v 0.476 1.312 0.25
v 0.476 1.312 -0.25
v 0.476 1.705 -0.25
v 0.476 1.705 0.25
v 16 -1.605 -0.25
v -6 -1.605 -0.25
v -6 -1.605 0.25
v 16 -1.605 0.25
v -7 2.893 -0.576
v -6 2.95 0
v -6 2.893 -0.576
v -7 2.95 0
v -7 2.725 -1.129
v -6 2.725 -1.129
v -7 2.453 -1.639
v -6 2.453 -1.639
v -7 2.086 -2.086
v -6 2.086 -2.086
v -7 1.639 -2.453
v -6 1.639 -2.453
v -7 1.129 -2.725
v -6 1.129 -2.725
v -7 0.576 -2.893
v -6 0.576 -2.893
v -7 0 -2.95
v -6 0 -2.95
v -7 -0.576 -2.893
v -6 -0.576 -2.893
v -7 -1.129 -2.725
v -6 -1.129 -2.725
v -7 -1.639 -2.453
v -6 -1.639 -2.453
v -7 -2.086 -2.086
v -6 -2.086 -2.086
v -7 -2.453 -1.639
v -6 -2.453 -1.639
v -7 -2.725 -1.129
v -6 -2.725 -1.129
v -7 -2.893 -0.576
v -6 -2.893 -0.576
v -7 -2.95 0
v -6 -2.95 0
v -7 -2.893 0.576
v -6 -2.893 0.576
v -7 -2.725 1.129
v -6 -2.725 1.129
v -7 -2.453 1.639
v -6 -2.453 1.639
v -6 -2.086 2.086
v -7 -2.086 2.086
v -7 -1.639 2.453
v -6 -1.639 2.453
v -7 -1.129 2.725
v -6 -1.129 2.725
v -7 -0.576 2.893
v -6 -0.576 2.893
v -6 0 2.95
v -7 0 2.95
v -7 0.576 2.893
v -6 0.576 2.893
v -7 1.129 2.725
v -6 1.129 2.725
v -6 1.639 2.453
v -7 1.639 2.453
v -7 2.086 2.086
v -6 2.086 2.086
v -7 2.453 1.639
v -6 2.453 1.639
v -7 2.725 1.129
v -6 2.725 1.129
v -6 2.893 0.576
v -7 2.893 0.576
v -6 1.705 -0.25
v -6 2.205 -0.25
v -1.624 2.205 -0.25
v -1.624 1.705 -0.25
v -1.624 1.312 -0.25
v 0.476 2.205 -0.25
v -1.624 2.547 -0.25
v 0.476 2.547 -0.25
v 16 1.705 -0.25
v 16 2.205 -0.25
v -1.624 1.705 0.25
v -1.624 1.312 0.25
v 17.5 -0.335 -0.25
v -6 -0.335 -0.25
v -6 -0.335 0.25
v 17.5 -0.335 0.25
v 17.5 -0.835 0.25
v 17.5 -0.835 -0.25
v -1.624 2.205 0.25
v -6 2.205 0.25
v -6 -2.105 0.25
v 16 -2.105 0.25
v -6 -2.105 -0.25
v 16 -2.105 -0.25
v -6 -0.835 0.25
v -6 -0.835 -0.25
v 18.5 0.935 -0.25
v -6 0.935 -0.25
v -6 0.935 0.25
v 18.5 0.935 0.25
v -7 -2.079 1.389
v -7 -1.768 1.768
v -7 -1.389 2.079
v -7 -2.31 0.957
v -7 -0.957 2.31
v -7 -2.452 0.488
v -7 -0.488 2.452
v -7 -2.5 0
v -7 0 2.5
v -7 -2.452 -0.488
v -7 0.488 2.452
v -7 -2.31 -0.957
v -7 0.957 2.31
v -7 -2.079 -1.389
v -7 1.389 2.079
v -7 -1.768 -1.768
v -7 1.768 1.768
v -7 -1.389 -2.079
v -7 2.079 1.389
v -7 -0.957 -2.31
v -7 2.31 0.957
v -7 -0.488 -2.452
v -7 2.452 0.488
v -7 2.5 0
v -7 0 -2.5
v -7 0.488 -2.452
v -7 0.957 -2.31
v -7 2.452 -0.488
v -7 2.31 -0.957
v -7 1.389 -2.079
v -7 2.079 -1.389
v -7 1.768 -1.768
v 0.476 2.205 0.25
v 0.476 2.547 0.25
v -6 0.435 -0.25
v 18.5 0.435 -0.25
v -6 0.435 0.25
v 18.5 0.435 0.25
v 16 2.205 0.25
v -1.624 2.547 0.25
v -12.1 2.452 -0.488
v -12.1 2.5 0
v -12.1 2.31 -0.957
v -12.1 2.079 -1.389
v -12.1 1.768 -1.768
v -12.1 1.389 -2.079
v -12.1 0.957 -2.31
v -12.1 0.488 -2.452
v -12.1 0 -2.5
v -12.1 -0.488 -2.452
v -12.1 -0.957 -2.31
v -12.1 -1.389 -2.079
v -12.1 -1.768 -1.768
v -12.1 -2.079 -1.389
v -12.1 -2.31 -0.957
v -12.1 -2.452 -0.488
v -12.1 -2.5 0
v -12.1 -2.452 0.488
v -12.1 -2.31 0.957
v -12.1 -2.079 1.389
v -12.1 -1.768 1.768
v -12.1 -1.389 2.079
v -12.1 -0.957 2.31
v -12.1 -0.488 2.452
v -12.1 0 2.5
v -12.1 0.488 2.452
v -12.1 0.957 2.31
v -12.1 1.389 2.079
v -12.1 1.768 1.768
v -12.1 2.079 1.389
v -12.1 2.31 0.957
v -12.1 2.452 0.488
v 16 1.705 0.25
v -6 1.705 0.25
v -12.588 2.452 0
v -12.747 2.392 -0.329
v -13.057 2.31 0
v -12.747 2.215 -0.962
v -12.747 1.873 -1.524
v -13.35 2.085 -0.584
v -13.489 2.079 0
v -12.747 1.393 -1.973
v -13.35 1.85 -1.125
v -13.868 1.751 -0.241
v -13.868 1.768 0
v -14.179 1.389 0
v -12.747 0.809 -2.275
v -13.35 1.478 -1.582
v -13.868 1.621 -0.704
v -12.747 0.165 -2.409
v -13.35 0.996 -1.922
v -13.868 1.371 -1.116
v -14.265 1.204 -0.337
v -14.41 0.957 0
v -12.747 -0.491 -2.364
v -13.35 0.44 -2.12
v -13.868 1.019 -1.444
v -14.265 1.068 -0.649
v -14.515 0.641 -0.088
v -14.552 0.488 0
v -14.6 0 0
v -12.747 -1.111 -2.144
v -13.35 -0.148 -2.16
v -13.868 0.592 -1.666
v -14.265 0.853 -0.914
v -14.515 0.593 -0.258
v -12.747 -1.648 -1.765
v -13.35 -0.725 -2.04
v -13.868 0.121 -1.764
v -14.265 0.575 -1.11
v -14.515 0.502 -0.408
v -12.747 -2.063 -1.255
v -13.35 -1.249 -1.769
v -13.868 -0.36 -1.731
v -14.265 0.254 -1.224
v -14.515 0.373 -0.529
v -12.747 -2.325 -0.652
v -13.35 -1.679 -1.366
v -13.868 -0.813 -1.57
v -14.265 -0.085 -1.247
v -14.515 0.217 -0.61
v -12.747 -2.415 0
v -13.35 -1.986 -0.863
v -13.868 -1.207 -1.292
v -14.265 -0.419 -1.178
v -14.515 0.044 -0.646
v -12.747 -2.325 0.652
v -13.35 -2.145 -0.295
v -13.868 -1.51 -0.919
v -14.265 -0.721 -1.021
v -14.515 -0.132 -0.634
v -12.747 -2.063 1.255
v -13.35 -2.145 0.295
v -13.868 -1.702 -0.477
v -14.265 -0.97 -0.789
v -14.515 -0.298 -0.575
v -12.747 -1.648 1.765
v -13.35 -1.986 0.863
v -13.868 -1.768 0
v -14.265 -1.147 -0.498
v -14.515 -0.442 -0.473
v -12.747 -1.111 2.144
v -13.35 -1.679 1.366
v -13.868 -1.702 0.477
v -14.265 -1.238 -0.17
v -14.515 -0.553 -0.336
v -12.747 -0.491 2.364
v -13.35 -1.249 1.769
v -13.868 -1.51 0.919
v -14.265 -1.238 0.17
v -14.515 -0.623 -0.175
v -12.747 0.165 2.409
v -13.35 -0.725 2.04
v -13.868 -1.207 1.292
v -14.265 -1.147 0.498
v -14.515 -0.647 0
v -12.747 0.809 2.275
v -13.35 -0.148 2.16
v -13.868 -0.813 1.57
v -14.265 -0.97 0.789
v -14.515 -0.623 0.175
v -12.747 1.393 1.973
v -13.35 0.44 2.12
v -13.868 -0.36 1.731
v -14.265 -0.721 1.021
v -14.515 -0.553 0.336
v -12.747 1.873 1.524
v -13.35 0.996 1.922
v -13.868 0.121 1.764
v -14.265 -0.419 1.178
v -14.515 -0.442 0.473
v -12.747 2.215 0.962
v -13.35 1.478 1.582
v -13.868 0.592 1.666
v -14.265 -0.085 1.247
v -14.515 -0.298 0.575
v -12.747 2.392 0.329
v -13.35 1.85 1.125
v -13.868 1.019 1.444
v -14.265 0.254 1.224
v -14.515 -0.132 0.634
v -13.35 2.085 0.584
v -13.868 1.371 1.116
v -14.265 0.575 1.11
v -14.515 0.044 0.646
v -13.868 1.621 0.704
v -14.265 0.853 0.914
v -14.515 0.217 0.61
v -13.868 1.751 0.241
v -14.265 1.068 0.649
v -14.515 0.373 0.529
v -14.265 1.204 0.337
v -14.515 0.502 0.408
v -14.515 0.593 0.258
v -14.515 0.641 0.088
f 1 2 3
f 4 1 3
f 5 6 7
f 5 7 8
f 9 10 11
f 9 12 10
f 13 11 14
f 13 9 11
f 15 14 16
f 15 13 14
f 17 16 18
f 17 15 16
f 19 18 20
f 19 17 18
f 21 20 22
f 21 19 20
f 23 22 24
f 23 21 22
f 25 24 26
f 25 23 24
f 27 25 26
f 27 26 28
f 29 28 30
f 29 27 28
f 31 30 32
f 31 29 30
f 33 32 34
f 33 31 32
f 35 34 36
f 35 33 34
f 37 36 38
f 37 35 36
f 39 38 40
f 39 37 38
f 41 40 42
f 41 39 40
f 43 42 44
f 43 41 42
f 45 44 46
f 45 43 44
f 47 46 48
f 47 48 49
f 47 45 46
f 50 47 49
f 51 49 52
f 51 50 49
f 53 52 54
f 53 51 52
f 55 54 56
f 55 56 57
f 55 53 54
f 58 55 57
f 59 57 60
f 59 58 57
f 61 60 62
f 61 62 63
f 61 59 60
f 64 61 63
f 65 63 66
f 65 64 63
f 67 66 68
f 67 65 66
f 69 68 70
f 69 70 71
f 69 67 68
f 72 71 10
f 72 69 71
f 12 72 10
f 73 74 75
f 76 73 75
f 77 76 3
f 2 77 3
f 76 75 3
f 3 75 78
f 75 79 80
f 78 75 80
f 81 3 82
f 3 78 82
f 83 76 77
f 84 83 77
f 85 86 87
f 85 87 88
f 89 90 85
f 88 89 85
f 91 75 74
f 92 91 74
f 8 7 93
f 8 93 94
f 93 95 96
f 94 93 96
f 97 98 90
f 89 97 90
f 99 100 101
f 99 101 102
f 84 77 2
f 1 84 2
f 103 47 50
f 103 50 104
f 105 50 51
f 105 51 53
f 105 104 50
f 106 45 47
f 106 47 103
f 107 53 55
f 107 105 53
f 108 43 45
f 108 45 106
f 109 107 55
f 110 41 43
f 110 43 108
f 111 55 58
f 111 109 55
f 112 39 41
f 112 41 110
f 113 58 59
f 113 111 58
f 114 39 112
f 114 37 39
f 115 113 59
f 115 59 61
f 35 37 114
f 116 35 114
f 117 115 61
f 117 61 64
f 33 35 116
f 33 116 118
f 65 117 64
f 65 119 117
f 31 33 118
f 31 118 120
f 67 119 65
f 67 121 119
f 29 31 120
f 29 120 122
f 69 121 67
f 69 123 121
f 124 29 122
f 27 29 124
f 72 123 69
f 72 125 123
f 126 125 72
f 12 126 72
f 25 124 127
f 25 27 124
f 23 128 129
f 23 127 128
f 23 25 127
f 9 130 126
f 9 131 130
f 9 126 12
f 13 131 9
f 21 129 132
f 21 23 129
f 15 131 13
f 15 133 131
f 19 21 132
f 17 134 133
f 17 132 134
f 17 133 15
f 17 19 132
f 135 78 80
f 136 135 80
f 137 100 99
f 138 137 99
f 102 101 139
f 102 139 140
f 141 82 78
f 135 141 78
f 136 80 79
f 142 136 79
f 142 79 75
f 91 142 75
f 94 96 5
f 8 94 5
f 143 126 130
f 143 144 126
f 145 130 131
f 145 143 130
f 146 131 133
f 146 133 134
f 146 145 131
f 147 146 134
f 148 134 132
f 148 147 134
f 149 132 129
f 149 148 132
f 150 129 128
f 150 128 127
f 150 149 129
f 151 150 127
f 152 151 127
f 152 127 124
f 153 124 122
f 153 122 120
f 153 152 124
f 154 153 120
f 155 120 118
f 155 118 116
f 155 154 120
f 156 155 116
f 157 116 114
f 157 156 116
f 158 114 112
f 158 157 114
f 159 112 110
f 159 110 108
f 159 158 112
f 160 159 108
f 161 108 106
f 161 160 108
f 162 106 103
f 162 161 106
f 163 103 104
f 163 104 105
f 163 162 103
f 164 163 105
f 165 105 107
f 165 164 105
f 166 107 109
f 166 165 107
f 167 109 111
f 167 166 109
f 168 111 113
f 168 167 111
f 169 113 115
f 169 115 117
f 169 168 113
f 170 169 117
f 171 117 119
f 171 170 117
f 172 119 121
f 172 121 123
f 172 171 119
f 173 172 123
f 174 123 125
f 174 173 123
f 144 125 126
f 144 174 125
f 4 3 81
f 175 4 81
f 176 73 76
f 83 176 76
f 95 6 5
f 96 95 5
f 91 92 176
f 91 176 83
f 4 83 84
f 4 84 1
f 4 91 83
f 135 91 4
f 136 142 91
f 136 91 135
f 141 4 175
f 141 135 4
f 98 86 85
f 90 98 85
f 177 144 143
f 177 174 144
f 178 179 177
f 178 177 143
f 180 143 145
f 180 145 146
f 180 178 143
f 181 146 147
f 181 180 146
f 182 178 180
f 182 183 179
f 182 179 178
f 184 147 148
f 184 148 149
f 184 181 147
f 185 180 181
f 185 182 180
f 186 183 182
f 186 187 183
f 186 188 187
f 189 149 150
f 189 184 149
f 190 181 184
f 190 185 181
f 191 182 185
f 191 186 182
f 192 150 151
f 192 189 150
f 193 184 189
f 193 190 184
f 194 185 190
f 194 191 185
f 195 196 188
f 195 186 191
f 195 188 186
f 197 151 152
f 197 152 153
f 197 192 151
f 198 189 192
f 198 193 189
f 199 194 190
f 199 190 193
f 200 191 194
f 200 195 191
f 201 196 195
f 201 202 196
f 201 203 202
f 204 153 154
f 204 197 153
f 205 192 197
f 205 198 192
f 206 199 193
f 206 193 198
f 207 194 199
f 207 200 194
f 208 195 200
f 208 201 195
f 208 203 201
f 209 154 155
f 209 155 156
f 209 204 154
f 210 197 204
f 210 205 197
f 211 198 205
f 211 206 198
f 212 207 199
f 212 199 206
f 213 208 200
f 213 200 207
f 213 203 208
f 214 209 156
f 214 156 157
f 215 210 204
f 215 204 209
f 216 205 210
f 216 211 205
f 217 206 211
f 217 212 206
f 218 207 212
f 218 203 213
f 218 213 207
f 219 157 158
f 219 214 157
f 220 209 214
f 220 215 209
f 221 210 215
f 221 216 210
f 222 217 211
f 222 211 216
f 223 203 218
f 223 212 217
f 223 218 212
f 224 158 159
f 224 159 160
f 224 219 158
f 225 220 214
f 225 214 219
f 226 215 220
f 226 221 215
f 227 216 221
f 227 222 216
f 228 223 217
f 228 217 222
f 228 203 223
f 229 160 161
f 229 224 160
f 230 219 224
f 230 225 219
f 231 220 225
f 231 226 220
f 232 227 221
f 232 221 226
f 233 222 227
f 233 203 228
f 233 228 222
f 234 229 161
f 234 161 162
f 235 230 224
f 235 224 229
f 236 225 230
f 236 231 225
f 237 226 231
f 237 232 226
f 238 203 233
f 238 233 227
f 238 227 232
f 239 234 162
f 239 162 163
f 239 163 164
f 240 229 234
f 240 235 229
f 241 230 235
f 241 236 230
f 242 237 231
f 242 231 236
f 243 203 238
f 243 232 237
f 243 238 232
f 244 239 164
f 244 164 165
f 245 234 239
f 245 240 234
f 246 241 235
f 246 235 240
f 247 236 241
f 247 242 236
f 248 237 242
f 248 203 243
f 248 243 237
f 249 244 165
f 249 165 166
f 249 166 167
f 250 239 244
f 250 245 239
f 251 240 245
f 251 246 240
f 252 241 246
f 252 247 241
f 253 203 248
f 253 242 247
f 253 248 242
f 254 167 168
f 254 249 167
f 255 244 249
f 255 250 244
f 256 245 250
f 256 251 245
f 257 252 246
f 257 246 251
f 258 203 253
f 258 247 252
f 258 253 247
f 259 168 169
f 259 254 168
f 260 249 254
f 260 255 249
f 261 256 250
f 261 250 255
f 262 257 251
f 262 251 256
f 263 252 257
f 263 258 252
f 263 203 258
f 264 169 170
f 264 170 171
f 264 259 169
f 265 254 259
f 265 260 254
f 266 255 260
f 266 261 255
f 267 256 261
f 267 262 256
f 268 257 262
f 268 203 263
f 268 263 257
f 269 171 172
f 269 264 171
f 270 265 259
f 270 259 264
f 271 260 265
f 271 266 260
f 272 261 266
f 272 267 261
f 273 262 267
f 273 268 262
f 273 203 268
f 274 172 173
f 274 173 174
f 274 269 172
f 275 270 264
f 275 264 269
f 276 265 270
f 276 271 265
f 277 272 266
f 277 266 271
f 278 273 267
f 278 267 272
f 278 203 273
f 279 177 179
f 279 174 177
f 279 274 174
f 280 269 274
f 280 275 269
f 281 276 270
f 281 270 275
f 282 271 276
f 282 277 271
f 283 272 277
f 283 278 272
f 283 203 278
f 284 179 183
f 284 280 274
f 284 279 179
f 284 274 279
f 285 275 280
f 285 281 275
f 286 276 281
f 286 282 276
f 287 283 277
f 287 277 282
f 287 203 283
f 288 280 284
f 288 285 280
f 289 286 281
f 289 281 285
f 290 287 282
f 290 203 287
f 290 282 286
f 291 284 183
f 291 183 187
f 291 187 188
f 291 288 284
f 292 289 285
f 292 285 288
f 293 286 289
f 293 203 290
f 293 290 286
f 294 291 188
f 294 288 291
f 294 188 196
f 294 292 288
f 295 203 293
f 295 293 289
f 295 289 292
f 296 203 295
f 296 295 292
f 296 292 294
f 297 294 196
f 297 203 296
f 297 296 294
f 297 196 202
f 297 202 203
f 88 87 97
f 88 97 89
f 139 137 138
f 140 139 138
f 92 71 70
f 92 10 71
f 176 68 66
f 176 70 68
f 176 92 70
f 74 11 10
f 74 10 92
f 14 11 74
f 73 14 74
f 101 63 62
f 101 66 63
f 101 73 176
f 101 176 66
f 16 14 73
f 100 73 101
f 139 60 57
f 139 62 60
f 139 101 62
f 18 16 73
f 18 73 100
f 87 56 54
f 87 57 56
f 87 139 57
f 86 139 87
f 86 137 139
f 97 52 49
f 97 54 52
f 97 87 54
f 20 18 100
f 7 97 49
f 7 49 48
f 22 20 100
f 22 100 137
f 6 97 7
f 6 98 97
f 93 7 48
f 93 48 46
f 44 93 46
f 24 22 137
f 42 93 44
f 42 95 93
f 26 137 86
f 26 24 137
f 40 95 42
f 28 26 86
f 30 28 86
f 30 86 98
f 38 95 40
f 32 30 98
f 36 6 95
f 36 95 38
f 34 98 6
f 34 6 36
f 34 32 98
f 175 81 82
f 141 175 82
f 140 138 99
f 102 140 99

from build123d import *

# Parameters (mm, degrees)
BOSS_EXTRUDE1_DEPTH      = 0.25
BOSS_EXTRUDE1_DEPTH_BACK = 0.25
SKETCH2_W                = 22
SKETCH2_H                = 0.5
SKETCH2_W_2              = 23.5
SKETCH2_W_3              = 24.5


with BuildPart() as part:
    # Sketch1 → Revolve1 (revolve)
    with BuildSketch(Plane.XY):
        with BuildLine():
            Line((-6, 0), (-6, -2.95))
            Line((-6, -2.95), (-7, -2.95))
            Line((-7, -2.95), (-7, -2.5))
            Line((-7, -2.5), (-12.1, -2.5))
            ThreePointArc((-12.1, -2.5), (-13.867766953, -1.767766953), (-14.6, 0))
            Line((-14.6, 0), (-6, 0))
        make_face()
    revolve(axis=Axis((-6, 0, 0), (-1, 0, 0)))

    # Sketch2 → Boss-Extrude1 (add, two sides: drawn at the far end of the back side and taken through both)
    with BuildSketch(Plane.XY.offset(-BOSS_EXTRUDE1_DEPTH_BACK)):
        with Locations((5, -1.855262181)):
            Rectangle(SKETCH2_W, SKETCH2_H)
        with Locations((5.75, -0.585262181)):
            Rectangle(SKETCH2_W_2, SKETCH2_H)
        with Locations((6.25, 0.684737819)):
            Rectangle(SKETCH2_W_3, SKETCH2_H)
        Polygon((-1.623745911, 2.204737819), (-6, 2.204737819), (-6, 1.704737819), (-1.623745911, 1.704737819), (-1.623745911, 1.311776605), (0.47641813, 1.311776605), (0.47641813, 1.704737819), (16, 1.704737819), (16, 2.204737819), (0.47641813, 2.204737819), (0.47641813, 2.547088342), (-1.623745911, 2.547088342), align=None)
    extrude(amount=BOSS_EXTRUDE1_DEPTH + BOSS_EXTRUDE1_DEPTH_BACK)


solid = part.part
